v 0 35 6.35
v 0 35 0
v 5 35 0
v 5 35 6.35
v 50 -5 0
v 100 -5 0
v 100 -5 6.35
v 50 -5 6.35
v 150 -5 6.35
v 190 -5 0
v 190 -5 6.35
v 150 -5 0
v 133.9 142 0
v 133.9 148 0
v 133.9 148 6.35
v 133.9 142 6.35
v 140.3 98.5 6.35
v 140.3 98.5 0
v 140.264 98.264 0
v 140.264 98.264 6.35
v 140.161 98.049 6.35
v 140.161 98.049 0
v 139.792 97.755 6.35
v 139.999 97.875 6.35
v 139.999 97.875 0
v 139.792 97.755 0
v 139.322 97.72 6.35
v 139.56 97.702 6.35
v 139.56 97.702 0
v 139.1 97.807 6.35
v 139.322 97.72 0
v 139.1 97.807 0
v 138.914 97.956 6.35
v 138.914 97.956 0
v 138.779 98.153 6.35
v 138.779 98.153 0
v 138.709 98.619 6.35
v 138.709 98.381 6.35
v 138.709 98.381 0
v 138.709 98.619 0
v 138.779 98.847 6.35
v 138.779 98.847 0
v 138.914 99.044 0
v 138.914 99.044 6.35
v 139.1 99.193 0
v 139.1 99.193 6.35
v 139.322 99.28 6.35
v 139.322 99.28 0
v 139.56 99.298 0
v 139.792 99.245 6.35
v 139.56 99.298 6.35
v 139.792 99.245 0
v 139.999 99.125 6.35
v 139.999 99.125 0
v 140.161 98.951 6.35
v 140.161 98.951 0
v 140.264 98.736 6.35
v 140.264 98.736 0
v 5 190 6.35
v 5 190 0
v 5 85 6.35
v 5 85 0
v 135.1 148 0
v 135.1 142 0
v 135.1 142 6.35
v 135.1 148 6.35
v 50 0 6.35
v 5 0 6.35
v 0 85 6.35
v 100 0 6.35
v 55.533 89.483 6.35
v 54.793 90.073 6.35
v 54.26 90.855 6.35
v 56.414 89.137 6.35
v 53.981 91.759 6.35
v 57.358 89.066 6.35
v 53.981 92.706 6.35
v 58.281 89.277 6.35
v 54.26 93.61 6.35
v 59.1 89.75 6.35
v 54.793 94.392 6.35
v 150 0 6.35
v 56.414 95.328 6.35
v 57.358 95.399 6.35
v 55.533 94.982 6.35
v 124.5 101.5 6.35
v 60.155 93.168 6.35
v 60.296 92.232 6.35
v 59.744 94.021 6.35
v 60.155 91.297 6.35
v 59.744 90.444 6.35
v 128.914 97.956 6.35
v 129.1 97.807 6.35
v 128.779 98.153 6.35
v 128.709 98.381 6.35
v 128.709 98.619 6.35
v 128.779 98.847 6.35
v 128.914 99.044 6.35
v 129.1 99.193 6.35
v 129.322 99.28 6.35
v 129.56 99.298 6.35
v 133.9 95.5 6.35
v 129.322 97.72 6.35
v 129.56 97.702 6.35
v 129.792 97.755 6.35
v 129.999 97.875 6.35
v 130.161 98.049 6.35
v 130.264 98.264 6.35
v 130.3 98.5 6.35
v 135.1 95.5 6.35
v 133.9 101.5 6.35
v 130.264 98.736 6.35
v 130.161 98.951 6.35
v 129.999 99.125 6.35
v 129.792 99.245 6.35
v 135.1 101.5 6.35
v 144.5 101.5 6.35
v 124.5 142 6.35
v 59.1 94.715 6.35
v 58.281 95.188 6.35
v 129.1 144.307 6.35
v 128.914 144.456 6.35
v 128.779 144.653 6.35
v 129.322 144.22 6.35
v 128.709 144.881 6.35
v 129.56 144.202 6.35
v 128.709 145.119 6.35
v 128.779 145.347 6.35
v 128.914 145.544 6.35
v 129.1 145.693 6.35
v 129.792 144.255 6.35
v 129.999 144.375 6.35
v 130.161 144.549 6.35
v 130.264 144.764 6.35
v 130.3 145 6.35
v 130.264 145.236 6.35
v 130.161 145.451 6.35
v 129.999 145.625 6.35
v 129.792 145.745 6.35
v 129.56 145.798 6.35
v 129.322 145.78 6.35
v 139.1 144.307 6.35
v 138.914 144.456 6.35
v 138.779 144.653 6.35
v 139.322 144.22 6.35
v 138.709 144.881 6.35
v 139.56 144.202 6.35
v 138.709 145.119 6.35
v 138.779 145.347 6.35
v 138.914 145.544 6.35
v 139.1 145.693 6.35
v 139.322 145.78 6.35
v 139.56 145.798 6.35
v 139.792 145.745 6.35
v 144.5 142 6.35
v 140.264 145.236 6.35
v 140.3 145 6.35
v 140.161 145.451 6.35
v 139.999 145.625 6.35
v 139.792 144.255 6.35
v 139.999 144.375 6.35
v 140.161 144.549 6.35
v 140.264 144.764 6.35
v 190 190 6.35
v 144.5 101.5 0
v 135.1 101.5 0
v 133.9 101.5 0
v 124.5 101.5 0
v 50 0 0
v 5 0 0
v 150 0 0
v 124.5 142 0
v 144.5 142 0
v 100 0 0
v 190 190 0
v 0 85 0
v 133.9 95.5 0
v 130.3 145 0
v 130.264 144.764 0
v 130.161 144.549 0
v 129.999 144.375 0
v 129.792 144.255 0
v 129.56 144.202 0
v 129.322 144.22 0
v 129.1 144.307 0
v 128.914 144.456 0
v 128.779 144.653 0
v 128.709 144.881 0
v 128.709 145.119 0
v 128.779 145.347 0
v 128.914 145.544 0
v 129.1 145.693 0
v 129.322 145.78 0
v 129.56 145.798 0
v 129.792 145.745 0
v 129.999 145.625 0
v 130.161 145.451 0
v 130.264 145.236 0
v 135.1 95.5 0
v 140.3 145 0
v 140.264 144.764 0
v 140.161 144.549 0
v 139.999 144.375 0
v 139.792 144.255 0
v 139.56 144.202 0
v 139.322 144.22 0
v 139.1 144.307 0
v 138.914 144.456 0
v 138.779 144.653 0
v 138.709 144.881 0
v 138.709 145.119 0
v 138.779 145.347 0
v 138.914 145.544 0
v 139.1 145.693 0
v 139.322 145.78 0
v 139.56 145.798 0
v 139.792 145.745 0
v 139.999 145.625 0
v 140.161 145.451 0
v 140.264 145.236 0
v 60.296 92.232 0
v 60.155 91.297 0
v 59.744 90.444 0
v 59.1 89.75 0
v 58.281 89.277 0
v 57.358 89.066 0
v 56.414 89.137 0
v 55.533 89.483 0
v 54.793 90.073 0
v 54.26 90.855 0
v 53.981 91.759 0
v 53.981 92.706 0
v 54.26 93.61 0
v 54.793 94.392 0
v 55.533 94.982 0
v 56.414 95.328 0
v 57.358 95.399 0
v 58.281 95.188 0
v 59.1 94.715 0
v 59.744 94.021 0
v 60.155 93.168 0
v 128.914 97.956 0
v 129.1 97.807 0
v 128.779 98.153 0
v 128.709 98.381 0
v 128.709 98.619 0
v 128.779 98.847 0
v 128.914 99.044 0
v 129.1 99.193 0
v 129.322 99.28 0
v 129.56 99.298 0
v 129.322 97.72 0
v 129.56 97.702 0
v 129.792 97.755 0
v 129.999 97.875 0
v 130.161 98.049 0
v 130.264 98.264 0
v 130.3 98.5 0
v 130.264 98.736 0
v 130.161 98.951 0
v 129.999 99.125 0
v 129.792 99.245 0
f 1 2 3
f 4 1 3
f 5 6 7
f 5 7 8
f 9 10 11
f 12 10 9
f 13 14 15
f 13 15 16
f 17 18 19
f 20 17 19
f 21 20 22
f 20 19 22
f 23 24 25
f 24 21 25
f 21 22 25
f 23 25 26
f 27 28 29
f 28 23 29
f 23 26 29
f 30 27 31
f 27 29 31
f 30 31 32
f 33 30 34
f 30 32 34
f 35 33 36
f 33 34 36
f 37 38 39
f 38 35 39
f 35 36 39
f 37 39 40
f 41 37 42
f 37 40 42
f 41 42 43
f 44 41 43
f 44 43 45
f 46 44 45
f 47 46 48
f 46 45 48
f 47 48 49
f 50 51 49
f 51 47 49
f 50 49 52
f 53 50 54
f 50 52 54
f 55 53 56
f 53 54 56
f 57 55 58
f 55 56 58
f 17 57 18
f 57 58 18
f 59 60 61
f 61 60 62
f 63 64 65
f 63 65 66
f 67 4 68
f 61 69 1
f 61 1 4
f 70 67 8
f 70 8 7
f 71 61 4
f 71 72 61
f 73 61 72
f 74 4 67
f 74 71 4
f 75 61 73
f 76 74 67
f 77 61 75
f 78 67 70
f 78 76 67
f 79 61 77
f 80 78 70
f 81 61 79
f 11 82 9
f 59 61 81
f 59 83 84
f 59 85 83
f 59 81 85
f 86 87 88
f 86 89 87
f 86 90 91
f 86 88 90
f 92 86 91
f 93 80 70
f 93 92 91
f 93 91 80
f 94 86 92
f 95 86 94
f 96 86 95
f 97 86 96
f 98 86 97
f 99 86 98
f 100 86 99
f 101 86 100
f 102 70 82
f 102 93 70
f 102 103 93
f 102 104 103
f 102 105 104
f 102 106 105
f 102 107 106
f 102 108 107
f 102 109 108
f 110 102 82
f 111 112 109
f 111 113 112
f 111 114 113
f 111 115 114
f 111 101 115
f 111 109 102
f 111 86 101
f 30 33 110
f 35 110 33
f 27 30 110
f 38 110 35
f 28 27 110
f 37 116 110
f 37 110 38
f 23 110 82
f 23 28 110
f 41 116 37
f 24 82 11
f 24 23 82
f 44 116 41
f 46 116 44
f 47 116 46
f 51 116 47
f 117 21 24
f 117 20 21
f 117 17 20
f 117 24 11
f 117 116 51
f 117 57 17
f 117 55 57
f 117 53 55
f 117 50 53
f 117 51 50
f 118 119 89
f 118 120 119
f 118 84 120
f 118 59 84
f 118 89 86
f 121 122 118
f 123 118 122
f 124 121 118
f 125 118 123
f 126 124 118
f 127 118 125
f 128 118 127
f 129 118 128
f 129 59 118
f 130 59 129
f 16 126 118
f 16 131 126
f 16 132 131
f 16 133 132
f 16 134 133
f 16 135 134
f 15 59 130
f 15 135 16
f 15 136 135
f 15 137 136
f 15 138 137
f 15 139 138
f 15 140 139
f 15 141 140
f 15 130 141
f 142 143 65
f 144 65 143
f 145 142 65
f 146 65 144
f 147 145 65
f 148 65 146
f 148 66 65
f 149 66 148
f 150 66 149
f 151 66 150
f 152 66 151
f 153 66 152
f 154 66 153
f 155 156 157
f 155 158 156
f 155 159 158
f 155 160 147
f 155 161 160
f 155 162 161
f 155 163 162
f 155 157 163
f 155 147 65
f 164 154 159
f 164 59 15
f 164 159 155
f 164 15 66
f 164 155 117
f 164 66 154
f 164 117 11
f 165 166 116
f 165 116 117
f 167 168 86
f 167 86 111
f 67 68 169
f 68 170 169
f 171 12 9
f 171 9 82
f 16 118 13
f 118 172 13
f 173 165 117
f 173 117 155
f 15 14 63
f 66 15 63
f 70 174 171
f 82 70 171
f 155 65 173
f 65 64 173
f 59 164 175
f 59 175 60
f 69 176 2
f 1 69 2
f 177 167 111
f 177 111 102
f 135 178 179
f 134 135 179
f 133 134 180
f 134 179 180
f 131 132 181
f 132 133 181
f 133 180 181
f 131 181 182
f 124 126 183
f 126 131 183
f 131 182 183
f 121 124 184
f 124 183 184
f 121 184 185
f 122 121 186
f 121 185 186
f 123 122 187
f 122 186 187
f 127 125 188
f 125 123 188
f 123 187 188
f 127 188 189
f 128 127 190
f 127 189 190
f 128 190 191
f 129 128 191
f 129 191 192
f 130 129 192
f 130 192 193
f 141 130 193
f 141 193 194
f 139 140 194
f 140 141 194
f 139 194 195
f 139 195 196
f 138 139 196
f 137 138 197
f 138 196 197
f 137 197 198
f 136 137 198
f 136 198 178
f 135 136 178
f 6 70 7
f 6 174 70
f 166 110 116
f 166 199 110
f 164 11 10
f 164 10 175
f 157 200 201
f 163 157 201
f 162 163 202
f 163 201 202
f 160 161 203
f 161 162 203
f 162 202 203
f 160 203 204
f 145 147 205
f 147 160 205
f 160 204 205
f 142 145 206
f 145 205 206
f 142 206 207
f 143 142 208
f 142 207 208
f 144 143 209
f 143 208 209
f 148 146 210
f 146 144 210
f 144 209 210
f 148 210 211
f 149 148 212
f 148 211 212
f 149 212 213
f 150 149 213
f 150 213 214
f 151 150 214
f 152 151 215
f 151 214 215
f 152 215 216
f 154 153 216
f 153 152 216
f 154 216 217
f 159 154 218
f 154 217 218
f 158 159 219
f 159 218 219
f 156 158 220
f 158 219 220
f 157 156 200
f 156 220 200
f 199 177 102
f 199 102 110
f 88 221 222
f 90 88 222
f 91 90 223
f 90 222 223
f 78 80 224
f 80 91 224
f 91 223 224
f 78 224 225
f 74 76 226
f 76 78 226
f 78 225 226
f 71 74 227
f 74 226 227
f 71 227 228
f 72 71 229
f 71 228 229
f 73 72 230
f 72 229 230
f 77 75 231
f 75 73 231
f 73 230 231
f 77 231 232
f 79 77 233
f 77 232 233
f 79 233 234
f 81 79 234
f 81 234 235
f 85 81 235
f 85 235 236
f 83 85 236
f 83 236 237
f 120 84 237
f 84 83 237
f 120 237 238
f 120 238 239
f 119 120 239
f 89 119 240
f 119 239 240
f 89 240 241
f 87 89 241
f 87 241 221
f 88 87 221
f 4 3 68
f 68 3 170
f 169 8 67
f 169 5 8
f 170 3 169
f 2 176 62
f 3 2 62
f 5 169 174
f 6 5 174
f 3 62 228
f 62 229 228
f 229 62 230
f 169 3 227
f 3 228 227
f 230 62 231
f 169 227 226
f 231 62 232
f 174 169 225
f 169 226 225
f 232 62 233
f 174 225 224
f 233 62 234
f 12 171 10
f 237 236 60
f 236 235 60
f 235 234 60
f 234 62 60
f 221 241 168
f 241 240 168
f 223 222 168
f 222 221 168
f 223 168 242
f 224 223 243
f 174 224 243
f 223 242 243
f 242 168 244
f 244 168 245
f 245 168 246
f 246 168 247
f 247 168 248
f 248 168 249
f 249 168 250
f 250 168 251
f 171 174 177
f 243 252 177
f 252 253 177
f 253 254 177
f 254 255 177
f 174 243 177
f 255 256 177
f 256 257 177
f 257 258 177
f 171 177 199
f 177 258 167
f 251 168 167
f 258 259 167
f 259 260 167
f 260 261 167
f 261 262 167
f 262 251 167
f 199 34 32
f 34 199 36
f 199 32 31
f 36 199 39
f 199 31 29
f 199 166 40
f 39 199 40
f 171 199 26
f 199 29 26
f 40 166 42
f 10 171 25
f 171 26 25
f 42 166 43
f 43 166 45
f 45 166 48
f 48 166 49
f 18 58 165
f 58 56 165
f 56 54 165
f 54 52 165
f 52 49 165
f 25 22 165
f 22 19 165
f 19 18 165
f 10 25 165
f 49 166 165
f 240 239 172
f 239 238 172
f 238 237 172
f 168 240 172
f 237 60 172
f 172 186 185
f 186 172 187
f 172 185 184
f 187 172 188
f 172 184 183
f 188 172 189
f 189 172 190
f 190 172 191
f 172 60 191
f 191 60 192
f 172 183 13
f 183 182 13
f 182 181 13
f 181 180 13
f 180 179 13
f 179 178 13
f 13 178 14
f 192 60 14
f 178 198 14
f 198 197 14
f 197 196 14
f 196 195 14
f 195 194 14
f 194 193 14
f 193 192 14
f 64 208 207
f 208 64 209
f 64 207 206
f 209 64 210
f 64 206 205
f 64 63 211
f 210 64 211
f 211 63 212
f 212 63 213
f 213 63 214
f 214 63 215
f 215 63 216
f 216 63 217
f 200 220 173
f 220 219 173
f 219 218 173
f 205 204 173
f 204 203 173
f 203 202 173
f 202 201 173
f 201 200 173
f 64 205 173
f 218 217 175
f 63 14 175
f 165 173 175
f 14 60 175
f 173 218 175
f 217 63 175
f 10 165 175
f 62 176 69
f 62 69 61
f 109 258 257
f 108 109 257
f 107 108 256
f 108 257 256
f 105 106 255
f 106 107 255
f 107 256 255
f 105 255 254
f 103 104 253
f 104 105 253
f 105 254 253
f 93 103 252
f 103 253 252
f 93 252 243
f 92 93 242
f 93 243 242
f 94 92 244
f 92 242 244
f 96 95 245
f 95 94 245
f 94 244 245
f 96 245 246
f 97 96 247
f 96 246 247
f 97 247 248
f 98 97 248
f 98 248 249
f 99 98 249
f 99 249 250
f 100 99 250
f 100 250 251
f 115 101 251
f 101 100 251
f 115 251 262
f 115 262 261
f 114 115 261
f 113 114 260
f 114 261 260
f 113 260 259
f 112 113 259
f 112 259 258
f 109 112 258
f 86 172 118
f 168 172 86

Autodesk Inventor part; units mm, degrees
ref_plane "YZ Plane" through (0, 0, 0) normal (1, 0, 0) x (0, 1, 0)
ref_plane "XZ Plane" through (0, 0, 0) normal (0, 1, 0) x (-1, 0, 0)
ref_plane "XY Plane" through (0, 0, 0) normal (0, 0, 1) x (1, 0, 0)
sketch "Block1" plane through (0, 0, 0) normal (0, 0, 1) x (1, 0, 0)
  circle A0 centre (-65.4812, 52.5391) radius 2.75 construction
  circle A1 centre (-65.4812, 52.5391) radius 5 construction
  line L0 (-55.4812, 62.5391) -> (-95.9812, 62.5391)
  line L1 (-95.9812, 62.5391) -> (-95.9812, 42.5391)
  arc A2 (-100.7311, 56.2391) -> (-100.7311, 58.8391) centre (-98.9812, 57.5391) ccw
  arc A3 (-100.7311, 46.2391) -> (-100.7311, 48.8391) centre (-98.9812, 47.5391) ccw
  line L2 (-95.9812, 42.5391) -> (-55.4812, 42.5391)
  arc A4 (-50.7312, 48.8391) -> (-50.7312, 46.2391) centre (-52.4812, 47.5391) ccw
  arc A5 (-50.7312, 58.8391) -> (-50.7312, 56.2391) centre (-52.4812, 57.5391) ccw
  line L3 (-55.4812, 62.5391) -> (-55.4812, 42.5391)
  point P0 (-74.5923, 52.5391)
sketch "open sketch to change param" plane through (0, 0, 0) normal (0, 0, 1) x (1, 0, 0)
  line L0 (0, 0) -> (450, 0)
  line L1 (450, 0) -> (450, 500)
  line L2 (0, 500) -> (0, 0)
  line L3 (225, 500) -> (225, 0) construction
  line L4 (0, 455) -> (5, 455)
  line L5 (5, 455) -> (5, 405)
  line L6 (5, 405) -> (0, 405)
  line L7 (0, 405) -> (0, 455)
  line L8 (450, 405) -> (450, 455)
  line L9 (100, 500) -> (100, 505)
  line L10 (100, 505) -> (50, 505)
  line L11 (50, 505) -> (50, 500)
  line L12 (50, 500) -> (0, 500)
  line L13 (200, 500) -> (200, 505)
  line L14 (200, 505) -> (150, 505)
  line L15 (150, 505) -> (150, 500)
  line L16 (300, 500) -> (300, 505)
  line L17 (300, 505) -> (250, 505)
  line L18 (250, 505) -> (250, 500)
  line L19 (400, 500) -> (400, 505)
  line L20 (400, 505) -> (350, 505)
  line L21 (350, 505) -> (350, 500)
  line L22 (150, 500) -> (100, 500)
  line L23 (250, 500) -> (200, 500)
  line L24 (450, 500) -> (400, 500)
  line L25 (350, 500) -> (300, 500)
  line L26 (5, 500) -> (5, 0)
  line L27 (445, 500) -> (445, 0)
  line L28 (0, 85) -> (5, 85)
  line L29 (0, 35) -> (5, 35)
  line L30 (450, 455) -> (445, 455)
  line L31 (445, 405) -> (450, 405)
  line L32 (450, 85) -> (445, 85)
  line L33 (450, 35) -> (445, 35)
  line L34 (0, 250) -> (445, 250)
  line L35 (100, 0) -> (100, -5)
  line L36 (100, -5) -> (50, -5)
  line L37 (50, -5) -> (50, 0)
  line L38 (200, 0) -> (200, -5)
  line L39 (200, -5) -> (150, -5)
  line L40 (150, -5) -> (150, 0)
  line L41 (300, 0) -> (300, -5)
  line L42 (300, -5) -> (250, -5)
  line L43 (250, -5) -> (250, 0)
  line L44 (400, 0) -> (400, -5)
  line L45 (400, -5) -> (350, -5)
  line L46 (350, -5) -> (350, 0)
  circle A0 centre (134.5, 132) radius 3.175
  line L47 (134.5, 132) -> (201.9264, 140.8134) construction
  line L48 (201.9264, 140.8134) -> (126.9265, 140.7316) construction
  line L49 (126.9265, 140.7316) -> (57.1208, 92.2325) construction
  line L50 (134.5, 132) -> (57.1208, 92.2325) construction
  line L51 (134.5, 132) -> (5, 132) construction
  circle A1 centre (57.1208, 92.2325) radius 3.175
  circle A2 centre (139.5, 145) radius 2.18
  circle A3 centre (129.5, 145) radius 2.18
  circle A4 centre (139.5, 98.5) radius 2.18
  circle A5 centre (129.5, 98.5) radius 2.18
  line L52 (201.9264, 140.8134) -> (-23.205, 247.8943) construction
  line L53 (133.9, 148) -> (133.9, 142)
  line L54 (133.9, 148) -> (135.1, 148)
  line L55 (135.1, 142) -> (135.1, 148)
  line L56 (133.9, 142) -> (135.1, 142)
  line L57 (135.1, 101.5) -> (133.9, 101.5)
  line L58 (133.9, 101.5) -> (133.9, 95.5)
  line L59 (133.9, 95.5) -> (135.1, 95.5)
  line L60 (135.1, 95.5) -> (135.1, 101.5)
  circle A6 centre (129.5, 145) radius 0.8
  circle A7 centre (139.5, 145) radius 0.8
  circle A8 centre (129.5, 98.5) radius 0.8
  circle A9 centre (139.5, 98.5) radius 0.8
  line L61 (0, 0) -> (0, 240)
  line L62 (0, 240) -> (-152.4, 240)
  line L63 (5, 0) -> (190, 0)
  line L64 (190, 0) -> (190, 190)
  line L65 (190, 190) -> (5, 190)
  line L66 (5, 190) -> (5, 0)
  circle A10 centre (134.5, 132) radius 2.75 construction
  circle A11 centre (134.5, 132) radius 5 construction
  line L67 (124.5, 142) -> (124.5, 101.5)
  line L68 (124.5, 101.5) -> (144.5, 101.5)
  arc A12 (130.8, 96.75) -> (128.2, 96.75) centre (129.5, 98.5) ccw
  arc A13 (140.8, 96.75) -> (138.2, 96.75) centre (139.5, 98.5) ccw
  line L69 (144.5, 101.5) -> (144.5, 142)
  arc A14 (138.2, 146.75) -> (140.8, 146.75) centre (139.5, 145) ccw
  arc A15 (128.2, 146.75) -> (130.8, 146.75) centre (129.5, 145) ccw
  line L70 (124.5, 142) -> (144.5, 142)
  point P0 (225, 240)
  point P1 (5, 480)
  point P2 (0, 455)
  point P3 (0, 405)
  point P4 (5, 405)
  point P5 (450, 35)
  point P6 (450, 85)
  point P7 (445, 85)
  point P8 (445, 405)
  point P9 (450, 405)
  point P10 (445, 35)
  point P11 (100, 0)
  point P12 (50, 0)
  point P13 (200, 0)
  point P14 (150, 0)
  point P15 (300, 0)
  point P16 (250, 0)
  point P17 (400, 0)
  point P18 (350, 0)
  point P19 (138.2, 146.75)
  point P20 (140.8, 146.75)
  point P21 (128.2, 146.75)
  point P22 (130.8, 146.75)
  point P23 (140.8, 96.75)
  point P24 (138.2, 96.75)
  point P25 (130.8, 96.75)
  point P26 (128.2, 96.75)
  point P27 (134.5, 142)
  point P28 (134.5, 142)
  point P29 (134.5, 101.5)
  point P30 (134.5, 101.5)
  point P31 (135.1, 101.5)
  point P32 (133.9, 101.5)
  dimension "d4" = 240
  dimension "d5" = 50
  dimension "d6" = 5
  dimension "d17" = 50
  dimension "d18" = 50
  dimension "d28" = 100
  dimension "d33" = 500
  dimension "d34" = 5
  dimension "d35" = 45
  dimension "d83" = 50
  dimension "d84" = 35
  dimension "d100" = 450
  dimension "d101" = 6.35
  dimension "d102" = 310.5
  dimension "d103" = 132
  dimension "d104" = -27.2
  dimension "d105" = 87
  dimension "d106" = 68
  dimension "d107" = 75
  dimension "d108" = 85
  dimension "d111" = 6.35
  dimension "d122" = 249.3
  dimension "d123" = 25.5
  dimension "d125" = 6
  dimension "d127" = 1.2
  dimension "d128" = 6
  dimension "d129" = 1.2
  dimension "d130" = 1.6
  dimension "d131" = 1.6
  dimension "d132" = 1.6
  dimension "d133" = 1.6
  dimension "d134" = 240
  dimension "d135" = 152.4
  dimension "d136" = 185
  dimension "d137" = 190
extrude "Extrusion1" add sketch "open sketch to change param" along normal blind 6.35 contours L26 L65 L64 L0 | L2 L28 L26 L29 | L0 L35 L36 L37 | L0 L38 L39 L40 | L26 L34 L27 L0 L64 L65 | L26 L5 L12 L11 L10 L9 L22 L15 L14 L13 L23 L18 L17 L16 L25 L21 L20 L19 L24 L27 L34 | L2 L4 L5 L6 | L0 L41 L42 L43 | L27 L30 L1 L31 | L32 L1 L33 L27 | L0 L44 L45 L46 | A2 | A3 | A4 | A5
sketch "Sketch2" plane through (0, 0, 6.35) normal (0, 0, 1) x (1, 0, 0)
  line L0 (0, 0) -> (0, -5)
  line L1 (0, -5) -> (190, -5)
  line L2 (190, -5) -> (190, 190)
  line L3 (190, 190) -> (0, 190)
  line L4 (0, 190) -> (0, -5)
  line L5 (0, 190) -> (0, 568.7197)
  line L6 (5, 405) -> (5, 85) projected
  line L7 (0, 568.7197) -> (531.5547, 568.7197)
  line L8 (531.5547, 568.7197) -> (531.5547, -5)
  line L9 (531.5547, -5) -> (190, -5)
  dimension "d138" = 5
  dimension "d139" = 190
  dimension "d140" = 195
extrude "Extrusion3" cut sketch "Sketch2" against normal blind 6.35 contours L5 L7 L8 L9 L2 L3
properties part number "Cut Pegboard Panel Skiba" material "Wood (Birch)"
